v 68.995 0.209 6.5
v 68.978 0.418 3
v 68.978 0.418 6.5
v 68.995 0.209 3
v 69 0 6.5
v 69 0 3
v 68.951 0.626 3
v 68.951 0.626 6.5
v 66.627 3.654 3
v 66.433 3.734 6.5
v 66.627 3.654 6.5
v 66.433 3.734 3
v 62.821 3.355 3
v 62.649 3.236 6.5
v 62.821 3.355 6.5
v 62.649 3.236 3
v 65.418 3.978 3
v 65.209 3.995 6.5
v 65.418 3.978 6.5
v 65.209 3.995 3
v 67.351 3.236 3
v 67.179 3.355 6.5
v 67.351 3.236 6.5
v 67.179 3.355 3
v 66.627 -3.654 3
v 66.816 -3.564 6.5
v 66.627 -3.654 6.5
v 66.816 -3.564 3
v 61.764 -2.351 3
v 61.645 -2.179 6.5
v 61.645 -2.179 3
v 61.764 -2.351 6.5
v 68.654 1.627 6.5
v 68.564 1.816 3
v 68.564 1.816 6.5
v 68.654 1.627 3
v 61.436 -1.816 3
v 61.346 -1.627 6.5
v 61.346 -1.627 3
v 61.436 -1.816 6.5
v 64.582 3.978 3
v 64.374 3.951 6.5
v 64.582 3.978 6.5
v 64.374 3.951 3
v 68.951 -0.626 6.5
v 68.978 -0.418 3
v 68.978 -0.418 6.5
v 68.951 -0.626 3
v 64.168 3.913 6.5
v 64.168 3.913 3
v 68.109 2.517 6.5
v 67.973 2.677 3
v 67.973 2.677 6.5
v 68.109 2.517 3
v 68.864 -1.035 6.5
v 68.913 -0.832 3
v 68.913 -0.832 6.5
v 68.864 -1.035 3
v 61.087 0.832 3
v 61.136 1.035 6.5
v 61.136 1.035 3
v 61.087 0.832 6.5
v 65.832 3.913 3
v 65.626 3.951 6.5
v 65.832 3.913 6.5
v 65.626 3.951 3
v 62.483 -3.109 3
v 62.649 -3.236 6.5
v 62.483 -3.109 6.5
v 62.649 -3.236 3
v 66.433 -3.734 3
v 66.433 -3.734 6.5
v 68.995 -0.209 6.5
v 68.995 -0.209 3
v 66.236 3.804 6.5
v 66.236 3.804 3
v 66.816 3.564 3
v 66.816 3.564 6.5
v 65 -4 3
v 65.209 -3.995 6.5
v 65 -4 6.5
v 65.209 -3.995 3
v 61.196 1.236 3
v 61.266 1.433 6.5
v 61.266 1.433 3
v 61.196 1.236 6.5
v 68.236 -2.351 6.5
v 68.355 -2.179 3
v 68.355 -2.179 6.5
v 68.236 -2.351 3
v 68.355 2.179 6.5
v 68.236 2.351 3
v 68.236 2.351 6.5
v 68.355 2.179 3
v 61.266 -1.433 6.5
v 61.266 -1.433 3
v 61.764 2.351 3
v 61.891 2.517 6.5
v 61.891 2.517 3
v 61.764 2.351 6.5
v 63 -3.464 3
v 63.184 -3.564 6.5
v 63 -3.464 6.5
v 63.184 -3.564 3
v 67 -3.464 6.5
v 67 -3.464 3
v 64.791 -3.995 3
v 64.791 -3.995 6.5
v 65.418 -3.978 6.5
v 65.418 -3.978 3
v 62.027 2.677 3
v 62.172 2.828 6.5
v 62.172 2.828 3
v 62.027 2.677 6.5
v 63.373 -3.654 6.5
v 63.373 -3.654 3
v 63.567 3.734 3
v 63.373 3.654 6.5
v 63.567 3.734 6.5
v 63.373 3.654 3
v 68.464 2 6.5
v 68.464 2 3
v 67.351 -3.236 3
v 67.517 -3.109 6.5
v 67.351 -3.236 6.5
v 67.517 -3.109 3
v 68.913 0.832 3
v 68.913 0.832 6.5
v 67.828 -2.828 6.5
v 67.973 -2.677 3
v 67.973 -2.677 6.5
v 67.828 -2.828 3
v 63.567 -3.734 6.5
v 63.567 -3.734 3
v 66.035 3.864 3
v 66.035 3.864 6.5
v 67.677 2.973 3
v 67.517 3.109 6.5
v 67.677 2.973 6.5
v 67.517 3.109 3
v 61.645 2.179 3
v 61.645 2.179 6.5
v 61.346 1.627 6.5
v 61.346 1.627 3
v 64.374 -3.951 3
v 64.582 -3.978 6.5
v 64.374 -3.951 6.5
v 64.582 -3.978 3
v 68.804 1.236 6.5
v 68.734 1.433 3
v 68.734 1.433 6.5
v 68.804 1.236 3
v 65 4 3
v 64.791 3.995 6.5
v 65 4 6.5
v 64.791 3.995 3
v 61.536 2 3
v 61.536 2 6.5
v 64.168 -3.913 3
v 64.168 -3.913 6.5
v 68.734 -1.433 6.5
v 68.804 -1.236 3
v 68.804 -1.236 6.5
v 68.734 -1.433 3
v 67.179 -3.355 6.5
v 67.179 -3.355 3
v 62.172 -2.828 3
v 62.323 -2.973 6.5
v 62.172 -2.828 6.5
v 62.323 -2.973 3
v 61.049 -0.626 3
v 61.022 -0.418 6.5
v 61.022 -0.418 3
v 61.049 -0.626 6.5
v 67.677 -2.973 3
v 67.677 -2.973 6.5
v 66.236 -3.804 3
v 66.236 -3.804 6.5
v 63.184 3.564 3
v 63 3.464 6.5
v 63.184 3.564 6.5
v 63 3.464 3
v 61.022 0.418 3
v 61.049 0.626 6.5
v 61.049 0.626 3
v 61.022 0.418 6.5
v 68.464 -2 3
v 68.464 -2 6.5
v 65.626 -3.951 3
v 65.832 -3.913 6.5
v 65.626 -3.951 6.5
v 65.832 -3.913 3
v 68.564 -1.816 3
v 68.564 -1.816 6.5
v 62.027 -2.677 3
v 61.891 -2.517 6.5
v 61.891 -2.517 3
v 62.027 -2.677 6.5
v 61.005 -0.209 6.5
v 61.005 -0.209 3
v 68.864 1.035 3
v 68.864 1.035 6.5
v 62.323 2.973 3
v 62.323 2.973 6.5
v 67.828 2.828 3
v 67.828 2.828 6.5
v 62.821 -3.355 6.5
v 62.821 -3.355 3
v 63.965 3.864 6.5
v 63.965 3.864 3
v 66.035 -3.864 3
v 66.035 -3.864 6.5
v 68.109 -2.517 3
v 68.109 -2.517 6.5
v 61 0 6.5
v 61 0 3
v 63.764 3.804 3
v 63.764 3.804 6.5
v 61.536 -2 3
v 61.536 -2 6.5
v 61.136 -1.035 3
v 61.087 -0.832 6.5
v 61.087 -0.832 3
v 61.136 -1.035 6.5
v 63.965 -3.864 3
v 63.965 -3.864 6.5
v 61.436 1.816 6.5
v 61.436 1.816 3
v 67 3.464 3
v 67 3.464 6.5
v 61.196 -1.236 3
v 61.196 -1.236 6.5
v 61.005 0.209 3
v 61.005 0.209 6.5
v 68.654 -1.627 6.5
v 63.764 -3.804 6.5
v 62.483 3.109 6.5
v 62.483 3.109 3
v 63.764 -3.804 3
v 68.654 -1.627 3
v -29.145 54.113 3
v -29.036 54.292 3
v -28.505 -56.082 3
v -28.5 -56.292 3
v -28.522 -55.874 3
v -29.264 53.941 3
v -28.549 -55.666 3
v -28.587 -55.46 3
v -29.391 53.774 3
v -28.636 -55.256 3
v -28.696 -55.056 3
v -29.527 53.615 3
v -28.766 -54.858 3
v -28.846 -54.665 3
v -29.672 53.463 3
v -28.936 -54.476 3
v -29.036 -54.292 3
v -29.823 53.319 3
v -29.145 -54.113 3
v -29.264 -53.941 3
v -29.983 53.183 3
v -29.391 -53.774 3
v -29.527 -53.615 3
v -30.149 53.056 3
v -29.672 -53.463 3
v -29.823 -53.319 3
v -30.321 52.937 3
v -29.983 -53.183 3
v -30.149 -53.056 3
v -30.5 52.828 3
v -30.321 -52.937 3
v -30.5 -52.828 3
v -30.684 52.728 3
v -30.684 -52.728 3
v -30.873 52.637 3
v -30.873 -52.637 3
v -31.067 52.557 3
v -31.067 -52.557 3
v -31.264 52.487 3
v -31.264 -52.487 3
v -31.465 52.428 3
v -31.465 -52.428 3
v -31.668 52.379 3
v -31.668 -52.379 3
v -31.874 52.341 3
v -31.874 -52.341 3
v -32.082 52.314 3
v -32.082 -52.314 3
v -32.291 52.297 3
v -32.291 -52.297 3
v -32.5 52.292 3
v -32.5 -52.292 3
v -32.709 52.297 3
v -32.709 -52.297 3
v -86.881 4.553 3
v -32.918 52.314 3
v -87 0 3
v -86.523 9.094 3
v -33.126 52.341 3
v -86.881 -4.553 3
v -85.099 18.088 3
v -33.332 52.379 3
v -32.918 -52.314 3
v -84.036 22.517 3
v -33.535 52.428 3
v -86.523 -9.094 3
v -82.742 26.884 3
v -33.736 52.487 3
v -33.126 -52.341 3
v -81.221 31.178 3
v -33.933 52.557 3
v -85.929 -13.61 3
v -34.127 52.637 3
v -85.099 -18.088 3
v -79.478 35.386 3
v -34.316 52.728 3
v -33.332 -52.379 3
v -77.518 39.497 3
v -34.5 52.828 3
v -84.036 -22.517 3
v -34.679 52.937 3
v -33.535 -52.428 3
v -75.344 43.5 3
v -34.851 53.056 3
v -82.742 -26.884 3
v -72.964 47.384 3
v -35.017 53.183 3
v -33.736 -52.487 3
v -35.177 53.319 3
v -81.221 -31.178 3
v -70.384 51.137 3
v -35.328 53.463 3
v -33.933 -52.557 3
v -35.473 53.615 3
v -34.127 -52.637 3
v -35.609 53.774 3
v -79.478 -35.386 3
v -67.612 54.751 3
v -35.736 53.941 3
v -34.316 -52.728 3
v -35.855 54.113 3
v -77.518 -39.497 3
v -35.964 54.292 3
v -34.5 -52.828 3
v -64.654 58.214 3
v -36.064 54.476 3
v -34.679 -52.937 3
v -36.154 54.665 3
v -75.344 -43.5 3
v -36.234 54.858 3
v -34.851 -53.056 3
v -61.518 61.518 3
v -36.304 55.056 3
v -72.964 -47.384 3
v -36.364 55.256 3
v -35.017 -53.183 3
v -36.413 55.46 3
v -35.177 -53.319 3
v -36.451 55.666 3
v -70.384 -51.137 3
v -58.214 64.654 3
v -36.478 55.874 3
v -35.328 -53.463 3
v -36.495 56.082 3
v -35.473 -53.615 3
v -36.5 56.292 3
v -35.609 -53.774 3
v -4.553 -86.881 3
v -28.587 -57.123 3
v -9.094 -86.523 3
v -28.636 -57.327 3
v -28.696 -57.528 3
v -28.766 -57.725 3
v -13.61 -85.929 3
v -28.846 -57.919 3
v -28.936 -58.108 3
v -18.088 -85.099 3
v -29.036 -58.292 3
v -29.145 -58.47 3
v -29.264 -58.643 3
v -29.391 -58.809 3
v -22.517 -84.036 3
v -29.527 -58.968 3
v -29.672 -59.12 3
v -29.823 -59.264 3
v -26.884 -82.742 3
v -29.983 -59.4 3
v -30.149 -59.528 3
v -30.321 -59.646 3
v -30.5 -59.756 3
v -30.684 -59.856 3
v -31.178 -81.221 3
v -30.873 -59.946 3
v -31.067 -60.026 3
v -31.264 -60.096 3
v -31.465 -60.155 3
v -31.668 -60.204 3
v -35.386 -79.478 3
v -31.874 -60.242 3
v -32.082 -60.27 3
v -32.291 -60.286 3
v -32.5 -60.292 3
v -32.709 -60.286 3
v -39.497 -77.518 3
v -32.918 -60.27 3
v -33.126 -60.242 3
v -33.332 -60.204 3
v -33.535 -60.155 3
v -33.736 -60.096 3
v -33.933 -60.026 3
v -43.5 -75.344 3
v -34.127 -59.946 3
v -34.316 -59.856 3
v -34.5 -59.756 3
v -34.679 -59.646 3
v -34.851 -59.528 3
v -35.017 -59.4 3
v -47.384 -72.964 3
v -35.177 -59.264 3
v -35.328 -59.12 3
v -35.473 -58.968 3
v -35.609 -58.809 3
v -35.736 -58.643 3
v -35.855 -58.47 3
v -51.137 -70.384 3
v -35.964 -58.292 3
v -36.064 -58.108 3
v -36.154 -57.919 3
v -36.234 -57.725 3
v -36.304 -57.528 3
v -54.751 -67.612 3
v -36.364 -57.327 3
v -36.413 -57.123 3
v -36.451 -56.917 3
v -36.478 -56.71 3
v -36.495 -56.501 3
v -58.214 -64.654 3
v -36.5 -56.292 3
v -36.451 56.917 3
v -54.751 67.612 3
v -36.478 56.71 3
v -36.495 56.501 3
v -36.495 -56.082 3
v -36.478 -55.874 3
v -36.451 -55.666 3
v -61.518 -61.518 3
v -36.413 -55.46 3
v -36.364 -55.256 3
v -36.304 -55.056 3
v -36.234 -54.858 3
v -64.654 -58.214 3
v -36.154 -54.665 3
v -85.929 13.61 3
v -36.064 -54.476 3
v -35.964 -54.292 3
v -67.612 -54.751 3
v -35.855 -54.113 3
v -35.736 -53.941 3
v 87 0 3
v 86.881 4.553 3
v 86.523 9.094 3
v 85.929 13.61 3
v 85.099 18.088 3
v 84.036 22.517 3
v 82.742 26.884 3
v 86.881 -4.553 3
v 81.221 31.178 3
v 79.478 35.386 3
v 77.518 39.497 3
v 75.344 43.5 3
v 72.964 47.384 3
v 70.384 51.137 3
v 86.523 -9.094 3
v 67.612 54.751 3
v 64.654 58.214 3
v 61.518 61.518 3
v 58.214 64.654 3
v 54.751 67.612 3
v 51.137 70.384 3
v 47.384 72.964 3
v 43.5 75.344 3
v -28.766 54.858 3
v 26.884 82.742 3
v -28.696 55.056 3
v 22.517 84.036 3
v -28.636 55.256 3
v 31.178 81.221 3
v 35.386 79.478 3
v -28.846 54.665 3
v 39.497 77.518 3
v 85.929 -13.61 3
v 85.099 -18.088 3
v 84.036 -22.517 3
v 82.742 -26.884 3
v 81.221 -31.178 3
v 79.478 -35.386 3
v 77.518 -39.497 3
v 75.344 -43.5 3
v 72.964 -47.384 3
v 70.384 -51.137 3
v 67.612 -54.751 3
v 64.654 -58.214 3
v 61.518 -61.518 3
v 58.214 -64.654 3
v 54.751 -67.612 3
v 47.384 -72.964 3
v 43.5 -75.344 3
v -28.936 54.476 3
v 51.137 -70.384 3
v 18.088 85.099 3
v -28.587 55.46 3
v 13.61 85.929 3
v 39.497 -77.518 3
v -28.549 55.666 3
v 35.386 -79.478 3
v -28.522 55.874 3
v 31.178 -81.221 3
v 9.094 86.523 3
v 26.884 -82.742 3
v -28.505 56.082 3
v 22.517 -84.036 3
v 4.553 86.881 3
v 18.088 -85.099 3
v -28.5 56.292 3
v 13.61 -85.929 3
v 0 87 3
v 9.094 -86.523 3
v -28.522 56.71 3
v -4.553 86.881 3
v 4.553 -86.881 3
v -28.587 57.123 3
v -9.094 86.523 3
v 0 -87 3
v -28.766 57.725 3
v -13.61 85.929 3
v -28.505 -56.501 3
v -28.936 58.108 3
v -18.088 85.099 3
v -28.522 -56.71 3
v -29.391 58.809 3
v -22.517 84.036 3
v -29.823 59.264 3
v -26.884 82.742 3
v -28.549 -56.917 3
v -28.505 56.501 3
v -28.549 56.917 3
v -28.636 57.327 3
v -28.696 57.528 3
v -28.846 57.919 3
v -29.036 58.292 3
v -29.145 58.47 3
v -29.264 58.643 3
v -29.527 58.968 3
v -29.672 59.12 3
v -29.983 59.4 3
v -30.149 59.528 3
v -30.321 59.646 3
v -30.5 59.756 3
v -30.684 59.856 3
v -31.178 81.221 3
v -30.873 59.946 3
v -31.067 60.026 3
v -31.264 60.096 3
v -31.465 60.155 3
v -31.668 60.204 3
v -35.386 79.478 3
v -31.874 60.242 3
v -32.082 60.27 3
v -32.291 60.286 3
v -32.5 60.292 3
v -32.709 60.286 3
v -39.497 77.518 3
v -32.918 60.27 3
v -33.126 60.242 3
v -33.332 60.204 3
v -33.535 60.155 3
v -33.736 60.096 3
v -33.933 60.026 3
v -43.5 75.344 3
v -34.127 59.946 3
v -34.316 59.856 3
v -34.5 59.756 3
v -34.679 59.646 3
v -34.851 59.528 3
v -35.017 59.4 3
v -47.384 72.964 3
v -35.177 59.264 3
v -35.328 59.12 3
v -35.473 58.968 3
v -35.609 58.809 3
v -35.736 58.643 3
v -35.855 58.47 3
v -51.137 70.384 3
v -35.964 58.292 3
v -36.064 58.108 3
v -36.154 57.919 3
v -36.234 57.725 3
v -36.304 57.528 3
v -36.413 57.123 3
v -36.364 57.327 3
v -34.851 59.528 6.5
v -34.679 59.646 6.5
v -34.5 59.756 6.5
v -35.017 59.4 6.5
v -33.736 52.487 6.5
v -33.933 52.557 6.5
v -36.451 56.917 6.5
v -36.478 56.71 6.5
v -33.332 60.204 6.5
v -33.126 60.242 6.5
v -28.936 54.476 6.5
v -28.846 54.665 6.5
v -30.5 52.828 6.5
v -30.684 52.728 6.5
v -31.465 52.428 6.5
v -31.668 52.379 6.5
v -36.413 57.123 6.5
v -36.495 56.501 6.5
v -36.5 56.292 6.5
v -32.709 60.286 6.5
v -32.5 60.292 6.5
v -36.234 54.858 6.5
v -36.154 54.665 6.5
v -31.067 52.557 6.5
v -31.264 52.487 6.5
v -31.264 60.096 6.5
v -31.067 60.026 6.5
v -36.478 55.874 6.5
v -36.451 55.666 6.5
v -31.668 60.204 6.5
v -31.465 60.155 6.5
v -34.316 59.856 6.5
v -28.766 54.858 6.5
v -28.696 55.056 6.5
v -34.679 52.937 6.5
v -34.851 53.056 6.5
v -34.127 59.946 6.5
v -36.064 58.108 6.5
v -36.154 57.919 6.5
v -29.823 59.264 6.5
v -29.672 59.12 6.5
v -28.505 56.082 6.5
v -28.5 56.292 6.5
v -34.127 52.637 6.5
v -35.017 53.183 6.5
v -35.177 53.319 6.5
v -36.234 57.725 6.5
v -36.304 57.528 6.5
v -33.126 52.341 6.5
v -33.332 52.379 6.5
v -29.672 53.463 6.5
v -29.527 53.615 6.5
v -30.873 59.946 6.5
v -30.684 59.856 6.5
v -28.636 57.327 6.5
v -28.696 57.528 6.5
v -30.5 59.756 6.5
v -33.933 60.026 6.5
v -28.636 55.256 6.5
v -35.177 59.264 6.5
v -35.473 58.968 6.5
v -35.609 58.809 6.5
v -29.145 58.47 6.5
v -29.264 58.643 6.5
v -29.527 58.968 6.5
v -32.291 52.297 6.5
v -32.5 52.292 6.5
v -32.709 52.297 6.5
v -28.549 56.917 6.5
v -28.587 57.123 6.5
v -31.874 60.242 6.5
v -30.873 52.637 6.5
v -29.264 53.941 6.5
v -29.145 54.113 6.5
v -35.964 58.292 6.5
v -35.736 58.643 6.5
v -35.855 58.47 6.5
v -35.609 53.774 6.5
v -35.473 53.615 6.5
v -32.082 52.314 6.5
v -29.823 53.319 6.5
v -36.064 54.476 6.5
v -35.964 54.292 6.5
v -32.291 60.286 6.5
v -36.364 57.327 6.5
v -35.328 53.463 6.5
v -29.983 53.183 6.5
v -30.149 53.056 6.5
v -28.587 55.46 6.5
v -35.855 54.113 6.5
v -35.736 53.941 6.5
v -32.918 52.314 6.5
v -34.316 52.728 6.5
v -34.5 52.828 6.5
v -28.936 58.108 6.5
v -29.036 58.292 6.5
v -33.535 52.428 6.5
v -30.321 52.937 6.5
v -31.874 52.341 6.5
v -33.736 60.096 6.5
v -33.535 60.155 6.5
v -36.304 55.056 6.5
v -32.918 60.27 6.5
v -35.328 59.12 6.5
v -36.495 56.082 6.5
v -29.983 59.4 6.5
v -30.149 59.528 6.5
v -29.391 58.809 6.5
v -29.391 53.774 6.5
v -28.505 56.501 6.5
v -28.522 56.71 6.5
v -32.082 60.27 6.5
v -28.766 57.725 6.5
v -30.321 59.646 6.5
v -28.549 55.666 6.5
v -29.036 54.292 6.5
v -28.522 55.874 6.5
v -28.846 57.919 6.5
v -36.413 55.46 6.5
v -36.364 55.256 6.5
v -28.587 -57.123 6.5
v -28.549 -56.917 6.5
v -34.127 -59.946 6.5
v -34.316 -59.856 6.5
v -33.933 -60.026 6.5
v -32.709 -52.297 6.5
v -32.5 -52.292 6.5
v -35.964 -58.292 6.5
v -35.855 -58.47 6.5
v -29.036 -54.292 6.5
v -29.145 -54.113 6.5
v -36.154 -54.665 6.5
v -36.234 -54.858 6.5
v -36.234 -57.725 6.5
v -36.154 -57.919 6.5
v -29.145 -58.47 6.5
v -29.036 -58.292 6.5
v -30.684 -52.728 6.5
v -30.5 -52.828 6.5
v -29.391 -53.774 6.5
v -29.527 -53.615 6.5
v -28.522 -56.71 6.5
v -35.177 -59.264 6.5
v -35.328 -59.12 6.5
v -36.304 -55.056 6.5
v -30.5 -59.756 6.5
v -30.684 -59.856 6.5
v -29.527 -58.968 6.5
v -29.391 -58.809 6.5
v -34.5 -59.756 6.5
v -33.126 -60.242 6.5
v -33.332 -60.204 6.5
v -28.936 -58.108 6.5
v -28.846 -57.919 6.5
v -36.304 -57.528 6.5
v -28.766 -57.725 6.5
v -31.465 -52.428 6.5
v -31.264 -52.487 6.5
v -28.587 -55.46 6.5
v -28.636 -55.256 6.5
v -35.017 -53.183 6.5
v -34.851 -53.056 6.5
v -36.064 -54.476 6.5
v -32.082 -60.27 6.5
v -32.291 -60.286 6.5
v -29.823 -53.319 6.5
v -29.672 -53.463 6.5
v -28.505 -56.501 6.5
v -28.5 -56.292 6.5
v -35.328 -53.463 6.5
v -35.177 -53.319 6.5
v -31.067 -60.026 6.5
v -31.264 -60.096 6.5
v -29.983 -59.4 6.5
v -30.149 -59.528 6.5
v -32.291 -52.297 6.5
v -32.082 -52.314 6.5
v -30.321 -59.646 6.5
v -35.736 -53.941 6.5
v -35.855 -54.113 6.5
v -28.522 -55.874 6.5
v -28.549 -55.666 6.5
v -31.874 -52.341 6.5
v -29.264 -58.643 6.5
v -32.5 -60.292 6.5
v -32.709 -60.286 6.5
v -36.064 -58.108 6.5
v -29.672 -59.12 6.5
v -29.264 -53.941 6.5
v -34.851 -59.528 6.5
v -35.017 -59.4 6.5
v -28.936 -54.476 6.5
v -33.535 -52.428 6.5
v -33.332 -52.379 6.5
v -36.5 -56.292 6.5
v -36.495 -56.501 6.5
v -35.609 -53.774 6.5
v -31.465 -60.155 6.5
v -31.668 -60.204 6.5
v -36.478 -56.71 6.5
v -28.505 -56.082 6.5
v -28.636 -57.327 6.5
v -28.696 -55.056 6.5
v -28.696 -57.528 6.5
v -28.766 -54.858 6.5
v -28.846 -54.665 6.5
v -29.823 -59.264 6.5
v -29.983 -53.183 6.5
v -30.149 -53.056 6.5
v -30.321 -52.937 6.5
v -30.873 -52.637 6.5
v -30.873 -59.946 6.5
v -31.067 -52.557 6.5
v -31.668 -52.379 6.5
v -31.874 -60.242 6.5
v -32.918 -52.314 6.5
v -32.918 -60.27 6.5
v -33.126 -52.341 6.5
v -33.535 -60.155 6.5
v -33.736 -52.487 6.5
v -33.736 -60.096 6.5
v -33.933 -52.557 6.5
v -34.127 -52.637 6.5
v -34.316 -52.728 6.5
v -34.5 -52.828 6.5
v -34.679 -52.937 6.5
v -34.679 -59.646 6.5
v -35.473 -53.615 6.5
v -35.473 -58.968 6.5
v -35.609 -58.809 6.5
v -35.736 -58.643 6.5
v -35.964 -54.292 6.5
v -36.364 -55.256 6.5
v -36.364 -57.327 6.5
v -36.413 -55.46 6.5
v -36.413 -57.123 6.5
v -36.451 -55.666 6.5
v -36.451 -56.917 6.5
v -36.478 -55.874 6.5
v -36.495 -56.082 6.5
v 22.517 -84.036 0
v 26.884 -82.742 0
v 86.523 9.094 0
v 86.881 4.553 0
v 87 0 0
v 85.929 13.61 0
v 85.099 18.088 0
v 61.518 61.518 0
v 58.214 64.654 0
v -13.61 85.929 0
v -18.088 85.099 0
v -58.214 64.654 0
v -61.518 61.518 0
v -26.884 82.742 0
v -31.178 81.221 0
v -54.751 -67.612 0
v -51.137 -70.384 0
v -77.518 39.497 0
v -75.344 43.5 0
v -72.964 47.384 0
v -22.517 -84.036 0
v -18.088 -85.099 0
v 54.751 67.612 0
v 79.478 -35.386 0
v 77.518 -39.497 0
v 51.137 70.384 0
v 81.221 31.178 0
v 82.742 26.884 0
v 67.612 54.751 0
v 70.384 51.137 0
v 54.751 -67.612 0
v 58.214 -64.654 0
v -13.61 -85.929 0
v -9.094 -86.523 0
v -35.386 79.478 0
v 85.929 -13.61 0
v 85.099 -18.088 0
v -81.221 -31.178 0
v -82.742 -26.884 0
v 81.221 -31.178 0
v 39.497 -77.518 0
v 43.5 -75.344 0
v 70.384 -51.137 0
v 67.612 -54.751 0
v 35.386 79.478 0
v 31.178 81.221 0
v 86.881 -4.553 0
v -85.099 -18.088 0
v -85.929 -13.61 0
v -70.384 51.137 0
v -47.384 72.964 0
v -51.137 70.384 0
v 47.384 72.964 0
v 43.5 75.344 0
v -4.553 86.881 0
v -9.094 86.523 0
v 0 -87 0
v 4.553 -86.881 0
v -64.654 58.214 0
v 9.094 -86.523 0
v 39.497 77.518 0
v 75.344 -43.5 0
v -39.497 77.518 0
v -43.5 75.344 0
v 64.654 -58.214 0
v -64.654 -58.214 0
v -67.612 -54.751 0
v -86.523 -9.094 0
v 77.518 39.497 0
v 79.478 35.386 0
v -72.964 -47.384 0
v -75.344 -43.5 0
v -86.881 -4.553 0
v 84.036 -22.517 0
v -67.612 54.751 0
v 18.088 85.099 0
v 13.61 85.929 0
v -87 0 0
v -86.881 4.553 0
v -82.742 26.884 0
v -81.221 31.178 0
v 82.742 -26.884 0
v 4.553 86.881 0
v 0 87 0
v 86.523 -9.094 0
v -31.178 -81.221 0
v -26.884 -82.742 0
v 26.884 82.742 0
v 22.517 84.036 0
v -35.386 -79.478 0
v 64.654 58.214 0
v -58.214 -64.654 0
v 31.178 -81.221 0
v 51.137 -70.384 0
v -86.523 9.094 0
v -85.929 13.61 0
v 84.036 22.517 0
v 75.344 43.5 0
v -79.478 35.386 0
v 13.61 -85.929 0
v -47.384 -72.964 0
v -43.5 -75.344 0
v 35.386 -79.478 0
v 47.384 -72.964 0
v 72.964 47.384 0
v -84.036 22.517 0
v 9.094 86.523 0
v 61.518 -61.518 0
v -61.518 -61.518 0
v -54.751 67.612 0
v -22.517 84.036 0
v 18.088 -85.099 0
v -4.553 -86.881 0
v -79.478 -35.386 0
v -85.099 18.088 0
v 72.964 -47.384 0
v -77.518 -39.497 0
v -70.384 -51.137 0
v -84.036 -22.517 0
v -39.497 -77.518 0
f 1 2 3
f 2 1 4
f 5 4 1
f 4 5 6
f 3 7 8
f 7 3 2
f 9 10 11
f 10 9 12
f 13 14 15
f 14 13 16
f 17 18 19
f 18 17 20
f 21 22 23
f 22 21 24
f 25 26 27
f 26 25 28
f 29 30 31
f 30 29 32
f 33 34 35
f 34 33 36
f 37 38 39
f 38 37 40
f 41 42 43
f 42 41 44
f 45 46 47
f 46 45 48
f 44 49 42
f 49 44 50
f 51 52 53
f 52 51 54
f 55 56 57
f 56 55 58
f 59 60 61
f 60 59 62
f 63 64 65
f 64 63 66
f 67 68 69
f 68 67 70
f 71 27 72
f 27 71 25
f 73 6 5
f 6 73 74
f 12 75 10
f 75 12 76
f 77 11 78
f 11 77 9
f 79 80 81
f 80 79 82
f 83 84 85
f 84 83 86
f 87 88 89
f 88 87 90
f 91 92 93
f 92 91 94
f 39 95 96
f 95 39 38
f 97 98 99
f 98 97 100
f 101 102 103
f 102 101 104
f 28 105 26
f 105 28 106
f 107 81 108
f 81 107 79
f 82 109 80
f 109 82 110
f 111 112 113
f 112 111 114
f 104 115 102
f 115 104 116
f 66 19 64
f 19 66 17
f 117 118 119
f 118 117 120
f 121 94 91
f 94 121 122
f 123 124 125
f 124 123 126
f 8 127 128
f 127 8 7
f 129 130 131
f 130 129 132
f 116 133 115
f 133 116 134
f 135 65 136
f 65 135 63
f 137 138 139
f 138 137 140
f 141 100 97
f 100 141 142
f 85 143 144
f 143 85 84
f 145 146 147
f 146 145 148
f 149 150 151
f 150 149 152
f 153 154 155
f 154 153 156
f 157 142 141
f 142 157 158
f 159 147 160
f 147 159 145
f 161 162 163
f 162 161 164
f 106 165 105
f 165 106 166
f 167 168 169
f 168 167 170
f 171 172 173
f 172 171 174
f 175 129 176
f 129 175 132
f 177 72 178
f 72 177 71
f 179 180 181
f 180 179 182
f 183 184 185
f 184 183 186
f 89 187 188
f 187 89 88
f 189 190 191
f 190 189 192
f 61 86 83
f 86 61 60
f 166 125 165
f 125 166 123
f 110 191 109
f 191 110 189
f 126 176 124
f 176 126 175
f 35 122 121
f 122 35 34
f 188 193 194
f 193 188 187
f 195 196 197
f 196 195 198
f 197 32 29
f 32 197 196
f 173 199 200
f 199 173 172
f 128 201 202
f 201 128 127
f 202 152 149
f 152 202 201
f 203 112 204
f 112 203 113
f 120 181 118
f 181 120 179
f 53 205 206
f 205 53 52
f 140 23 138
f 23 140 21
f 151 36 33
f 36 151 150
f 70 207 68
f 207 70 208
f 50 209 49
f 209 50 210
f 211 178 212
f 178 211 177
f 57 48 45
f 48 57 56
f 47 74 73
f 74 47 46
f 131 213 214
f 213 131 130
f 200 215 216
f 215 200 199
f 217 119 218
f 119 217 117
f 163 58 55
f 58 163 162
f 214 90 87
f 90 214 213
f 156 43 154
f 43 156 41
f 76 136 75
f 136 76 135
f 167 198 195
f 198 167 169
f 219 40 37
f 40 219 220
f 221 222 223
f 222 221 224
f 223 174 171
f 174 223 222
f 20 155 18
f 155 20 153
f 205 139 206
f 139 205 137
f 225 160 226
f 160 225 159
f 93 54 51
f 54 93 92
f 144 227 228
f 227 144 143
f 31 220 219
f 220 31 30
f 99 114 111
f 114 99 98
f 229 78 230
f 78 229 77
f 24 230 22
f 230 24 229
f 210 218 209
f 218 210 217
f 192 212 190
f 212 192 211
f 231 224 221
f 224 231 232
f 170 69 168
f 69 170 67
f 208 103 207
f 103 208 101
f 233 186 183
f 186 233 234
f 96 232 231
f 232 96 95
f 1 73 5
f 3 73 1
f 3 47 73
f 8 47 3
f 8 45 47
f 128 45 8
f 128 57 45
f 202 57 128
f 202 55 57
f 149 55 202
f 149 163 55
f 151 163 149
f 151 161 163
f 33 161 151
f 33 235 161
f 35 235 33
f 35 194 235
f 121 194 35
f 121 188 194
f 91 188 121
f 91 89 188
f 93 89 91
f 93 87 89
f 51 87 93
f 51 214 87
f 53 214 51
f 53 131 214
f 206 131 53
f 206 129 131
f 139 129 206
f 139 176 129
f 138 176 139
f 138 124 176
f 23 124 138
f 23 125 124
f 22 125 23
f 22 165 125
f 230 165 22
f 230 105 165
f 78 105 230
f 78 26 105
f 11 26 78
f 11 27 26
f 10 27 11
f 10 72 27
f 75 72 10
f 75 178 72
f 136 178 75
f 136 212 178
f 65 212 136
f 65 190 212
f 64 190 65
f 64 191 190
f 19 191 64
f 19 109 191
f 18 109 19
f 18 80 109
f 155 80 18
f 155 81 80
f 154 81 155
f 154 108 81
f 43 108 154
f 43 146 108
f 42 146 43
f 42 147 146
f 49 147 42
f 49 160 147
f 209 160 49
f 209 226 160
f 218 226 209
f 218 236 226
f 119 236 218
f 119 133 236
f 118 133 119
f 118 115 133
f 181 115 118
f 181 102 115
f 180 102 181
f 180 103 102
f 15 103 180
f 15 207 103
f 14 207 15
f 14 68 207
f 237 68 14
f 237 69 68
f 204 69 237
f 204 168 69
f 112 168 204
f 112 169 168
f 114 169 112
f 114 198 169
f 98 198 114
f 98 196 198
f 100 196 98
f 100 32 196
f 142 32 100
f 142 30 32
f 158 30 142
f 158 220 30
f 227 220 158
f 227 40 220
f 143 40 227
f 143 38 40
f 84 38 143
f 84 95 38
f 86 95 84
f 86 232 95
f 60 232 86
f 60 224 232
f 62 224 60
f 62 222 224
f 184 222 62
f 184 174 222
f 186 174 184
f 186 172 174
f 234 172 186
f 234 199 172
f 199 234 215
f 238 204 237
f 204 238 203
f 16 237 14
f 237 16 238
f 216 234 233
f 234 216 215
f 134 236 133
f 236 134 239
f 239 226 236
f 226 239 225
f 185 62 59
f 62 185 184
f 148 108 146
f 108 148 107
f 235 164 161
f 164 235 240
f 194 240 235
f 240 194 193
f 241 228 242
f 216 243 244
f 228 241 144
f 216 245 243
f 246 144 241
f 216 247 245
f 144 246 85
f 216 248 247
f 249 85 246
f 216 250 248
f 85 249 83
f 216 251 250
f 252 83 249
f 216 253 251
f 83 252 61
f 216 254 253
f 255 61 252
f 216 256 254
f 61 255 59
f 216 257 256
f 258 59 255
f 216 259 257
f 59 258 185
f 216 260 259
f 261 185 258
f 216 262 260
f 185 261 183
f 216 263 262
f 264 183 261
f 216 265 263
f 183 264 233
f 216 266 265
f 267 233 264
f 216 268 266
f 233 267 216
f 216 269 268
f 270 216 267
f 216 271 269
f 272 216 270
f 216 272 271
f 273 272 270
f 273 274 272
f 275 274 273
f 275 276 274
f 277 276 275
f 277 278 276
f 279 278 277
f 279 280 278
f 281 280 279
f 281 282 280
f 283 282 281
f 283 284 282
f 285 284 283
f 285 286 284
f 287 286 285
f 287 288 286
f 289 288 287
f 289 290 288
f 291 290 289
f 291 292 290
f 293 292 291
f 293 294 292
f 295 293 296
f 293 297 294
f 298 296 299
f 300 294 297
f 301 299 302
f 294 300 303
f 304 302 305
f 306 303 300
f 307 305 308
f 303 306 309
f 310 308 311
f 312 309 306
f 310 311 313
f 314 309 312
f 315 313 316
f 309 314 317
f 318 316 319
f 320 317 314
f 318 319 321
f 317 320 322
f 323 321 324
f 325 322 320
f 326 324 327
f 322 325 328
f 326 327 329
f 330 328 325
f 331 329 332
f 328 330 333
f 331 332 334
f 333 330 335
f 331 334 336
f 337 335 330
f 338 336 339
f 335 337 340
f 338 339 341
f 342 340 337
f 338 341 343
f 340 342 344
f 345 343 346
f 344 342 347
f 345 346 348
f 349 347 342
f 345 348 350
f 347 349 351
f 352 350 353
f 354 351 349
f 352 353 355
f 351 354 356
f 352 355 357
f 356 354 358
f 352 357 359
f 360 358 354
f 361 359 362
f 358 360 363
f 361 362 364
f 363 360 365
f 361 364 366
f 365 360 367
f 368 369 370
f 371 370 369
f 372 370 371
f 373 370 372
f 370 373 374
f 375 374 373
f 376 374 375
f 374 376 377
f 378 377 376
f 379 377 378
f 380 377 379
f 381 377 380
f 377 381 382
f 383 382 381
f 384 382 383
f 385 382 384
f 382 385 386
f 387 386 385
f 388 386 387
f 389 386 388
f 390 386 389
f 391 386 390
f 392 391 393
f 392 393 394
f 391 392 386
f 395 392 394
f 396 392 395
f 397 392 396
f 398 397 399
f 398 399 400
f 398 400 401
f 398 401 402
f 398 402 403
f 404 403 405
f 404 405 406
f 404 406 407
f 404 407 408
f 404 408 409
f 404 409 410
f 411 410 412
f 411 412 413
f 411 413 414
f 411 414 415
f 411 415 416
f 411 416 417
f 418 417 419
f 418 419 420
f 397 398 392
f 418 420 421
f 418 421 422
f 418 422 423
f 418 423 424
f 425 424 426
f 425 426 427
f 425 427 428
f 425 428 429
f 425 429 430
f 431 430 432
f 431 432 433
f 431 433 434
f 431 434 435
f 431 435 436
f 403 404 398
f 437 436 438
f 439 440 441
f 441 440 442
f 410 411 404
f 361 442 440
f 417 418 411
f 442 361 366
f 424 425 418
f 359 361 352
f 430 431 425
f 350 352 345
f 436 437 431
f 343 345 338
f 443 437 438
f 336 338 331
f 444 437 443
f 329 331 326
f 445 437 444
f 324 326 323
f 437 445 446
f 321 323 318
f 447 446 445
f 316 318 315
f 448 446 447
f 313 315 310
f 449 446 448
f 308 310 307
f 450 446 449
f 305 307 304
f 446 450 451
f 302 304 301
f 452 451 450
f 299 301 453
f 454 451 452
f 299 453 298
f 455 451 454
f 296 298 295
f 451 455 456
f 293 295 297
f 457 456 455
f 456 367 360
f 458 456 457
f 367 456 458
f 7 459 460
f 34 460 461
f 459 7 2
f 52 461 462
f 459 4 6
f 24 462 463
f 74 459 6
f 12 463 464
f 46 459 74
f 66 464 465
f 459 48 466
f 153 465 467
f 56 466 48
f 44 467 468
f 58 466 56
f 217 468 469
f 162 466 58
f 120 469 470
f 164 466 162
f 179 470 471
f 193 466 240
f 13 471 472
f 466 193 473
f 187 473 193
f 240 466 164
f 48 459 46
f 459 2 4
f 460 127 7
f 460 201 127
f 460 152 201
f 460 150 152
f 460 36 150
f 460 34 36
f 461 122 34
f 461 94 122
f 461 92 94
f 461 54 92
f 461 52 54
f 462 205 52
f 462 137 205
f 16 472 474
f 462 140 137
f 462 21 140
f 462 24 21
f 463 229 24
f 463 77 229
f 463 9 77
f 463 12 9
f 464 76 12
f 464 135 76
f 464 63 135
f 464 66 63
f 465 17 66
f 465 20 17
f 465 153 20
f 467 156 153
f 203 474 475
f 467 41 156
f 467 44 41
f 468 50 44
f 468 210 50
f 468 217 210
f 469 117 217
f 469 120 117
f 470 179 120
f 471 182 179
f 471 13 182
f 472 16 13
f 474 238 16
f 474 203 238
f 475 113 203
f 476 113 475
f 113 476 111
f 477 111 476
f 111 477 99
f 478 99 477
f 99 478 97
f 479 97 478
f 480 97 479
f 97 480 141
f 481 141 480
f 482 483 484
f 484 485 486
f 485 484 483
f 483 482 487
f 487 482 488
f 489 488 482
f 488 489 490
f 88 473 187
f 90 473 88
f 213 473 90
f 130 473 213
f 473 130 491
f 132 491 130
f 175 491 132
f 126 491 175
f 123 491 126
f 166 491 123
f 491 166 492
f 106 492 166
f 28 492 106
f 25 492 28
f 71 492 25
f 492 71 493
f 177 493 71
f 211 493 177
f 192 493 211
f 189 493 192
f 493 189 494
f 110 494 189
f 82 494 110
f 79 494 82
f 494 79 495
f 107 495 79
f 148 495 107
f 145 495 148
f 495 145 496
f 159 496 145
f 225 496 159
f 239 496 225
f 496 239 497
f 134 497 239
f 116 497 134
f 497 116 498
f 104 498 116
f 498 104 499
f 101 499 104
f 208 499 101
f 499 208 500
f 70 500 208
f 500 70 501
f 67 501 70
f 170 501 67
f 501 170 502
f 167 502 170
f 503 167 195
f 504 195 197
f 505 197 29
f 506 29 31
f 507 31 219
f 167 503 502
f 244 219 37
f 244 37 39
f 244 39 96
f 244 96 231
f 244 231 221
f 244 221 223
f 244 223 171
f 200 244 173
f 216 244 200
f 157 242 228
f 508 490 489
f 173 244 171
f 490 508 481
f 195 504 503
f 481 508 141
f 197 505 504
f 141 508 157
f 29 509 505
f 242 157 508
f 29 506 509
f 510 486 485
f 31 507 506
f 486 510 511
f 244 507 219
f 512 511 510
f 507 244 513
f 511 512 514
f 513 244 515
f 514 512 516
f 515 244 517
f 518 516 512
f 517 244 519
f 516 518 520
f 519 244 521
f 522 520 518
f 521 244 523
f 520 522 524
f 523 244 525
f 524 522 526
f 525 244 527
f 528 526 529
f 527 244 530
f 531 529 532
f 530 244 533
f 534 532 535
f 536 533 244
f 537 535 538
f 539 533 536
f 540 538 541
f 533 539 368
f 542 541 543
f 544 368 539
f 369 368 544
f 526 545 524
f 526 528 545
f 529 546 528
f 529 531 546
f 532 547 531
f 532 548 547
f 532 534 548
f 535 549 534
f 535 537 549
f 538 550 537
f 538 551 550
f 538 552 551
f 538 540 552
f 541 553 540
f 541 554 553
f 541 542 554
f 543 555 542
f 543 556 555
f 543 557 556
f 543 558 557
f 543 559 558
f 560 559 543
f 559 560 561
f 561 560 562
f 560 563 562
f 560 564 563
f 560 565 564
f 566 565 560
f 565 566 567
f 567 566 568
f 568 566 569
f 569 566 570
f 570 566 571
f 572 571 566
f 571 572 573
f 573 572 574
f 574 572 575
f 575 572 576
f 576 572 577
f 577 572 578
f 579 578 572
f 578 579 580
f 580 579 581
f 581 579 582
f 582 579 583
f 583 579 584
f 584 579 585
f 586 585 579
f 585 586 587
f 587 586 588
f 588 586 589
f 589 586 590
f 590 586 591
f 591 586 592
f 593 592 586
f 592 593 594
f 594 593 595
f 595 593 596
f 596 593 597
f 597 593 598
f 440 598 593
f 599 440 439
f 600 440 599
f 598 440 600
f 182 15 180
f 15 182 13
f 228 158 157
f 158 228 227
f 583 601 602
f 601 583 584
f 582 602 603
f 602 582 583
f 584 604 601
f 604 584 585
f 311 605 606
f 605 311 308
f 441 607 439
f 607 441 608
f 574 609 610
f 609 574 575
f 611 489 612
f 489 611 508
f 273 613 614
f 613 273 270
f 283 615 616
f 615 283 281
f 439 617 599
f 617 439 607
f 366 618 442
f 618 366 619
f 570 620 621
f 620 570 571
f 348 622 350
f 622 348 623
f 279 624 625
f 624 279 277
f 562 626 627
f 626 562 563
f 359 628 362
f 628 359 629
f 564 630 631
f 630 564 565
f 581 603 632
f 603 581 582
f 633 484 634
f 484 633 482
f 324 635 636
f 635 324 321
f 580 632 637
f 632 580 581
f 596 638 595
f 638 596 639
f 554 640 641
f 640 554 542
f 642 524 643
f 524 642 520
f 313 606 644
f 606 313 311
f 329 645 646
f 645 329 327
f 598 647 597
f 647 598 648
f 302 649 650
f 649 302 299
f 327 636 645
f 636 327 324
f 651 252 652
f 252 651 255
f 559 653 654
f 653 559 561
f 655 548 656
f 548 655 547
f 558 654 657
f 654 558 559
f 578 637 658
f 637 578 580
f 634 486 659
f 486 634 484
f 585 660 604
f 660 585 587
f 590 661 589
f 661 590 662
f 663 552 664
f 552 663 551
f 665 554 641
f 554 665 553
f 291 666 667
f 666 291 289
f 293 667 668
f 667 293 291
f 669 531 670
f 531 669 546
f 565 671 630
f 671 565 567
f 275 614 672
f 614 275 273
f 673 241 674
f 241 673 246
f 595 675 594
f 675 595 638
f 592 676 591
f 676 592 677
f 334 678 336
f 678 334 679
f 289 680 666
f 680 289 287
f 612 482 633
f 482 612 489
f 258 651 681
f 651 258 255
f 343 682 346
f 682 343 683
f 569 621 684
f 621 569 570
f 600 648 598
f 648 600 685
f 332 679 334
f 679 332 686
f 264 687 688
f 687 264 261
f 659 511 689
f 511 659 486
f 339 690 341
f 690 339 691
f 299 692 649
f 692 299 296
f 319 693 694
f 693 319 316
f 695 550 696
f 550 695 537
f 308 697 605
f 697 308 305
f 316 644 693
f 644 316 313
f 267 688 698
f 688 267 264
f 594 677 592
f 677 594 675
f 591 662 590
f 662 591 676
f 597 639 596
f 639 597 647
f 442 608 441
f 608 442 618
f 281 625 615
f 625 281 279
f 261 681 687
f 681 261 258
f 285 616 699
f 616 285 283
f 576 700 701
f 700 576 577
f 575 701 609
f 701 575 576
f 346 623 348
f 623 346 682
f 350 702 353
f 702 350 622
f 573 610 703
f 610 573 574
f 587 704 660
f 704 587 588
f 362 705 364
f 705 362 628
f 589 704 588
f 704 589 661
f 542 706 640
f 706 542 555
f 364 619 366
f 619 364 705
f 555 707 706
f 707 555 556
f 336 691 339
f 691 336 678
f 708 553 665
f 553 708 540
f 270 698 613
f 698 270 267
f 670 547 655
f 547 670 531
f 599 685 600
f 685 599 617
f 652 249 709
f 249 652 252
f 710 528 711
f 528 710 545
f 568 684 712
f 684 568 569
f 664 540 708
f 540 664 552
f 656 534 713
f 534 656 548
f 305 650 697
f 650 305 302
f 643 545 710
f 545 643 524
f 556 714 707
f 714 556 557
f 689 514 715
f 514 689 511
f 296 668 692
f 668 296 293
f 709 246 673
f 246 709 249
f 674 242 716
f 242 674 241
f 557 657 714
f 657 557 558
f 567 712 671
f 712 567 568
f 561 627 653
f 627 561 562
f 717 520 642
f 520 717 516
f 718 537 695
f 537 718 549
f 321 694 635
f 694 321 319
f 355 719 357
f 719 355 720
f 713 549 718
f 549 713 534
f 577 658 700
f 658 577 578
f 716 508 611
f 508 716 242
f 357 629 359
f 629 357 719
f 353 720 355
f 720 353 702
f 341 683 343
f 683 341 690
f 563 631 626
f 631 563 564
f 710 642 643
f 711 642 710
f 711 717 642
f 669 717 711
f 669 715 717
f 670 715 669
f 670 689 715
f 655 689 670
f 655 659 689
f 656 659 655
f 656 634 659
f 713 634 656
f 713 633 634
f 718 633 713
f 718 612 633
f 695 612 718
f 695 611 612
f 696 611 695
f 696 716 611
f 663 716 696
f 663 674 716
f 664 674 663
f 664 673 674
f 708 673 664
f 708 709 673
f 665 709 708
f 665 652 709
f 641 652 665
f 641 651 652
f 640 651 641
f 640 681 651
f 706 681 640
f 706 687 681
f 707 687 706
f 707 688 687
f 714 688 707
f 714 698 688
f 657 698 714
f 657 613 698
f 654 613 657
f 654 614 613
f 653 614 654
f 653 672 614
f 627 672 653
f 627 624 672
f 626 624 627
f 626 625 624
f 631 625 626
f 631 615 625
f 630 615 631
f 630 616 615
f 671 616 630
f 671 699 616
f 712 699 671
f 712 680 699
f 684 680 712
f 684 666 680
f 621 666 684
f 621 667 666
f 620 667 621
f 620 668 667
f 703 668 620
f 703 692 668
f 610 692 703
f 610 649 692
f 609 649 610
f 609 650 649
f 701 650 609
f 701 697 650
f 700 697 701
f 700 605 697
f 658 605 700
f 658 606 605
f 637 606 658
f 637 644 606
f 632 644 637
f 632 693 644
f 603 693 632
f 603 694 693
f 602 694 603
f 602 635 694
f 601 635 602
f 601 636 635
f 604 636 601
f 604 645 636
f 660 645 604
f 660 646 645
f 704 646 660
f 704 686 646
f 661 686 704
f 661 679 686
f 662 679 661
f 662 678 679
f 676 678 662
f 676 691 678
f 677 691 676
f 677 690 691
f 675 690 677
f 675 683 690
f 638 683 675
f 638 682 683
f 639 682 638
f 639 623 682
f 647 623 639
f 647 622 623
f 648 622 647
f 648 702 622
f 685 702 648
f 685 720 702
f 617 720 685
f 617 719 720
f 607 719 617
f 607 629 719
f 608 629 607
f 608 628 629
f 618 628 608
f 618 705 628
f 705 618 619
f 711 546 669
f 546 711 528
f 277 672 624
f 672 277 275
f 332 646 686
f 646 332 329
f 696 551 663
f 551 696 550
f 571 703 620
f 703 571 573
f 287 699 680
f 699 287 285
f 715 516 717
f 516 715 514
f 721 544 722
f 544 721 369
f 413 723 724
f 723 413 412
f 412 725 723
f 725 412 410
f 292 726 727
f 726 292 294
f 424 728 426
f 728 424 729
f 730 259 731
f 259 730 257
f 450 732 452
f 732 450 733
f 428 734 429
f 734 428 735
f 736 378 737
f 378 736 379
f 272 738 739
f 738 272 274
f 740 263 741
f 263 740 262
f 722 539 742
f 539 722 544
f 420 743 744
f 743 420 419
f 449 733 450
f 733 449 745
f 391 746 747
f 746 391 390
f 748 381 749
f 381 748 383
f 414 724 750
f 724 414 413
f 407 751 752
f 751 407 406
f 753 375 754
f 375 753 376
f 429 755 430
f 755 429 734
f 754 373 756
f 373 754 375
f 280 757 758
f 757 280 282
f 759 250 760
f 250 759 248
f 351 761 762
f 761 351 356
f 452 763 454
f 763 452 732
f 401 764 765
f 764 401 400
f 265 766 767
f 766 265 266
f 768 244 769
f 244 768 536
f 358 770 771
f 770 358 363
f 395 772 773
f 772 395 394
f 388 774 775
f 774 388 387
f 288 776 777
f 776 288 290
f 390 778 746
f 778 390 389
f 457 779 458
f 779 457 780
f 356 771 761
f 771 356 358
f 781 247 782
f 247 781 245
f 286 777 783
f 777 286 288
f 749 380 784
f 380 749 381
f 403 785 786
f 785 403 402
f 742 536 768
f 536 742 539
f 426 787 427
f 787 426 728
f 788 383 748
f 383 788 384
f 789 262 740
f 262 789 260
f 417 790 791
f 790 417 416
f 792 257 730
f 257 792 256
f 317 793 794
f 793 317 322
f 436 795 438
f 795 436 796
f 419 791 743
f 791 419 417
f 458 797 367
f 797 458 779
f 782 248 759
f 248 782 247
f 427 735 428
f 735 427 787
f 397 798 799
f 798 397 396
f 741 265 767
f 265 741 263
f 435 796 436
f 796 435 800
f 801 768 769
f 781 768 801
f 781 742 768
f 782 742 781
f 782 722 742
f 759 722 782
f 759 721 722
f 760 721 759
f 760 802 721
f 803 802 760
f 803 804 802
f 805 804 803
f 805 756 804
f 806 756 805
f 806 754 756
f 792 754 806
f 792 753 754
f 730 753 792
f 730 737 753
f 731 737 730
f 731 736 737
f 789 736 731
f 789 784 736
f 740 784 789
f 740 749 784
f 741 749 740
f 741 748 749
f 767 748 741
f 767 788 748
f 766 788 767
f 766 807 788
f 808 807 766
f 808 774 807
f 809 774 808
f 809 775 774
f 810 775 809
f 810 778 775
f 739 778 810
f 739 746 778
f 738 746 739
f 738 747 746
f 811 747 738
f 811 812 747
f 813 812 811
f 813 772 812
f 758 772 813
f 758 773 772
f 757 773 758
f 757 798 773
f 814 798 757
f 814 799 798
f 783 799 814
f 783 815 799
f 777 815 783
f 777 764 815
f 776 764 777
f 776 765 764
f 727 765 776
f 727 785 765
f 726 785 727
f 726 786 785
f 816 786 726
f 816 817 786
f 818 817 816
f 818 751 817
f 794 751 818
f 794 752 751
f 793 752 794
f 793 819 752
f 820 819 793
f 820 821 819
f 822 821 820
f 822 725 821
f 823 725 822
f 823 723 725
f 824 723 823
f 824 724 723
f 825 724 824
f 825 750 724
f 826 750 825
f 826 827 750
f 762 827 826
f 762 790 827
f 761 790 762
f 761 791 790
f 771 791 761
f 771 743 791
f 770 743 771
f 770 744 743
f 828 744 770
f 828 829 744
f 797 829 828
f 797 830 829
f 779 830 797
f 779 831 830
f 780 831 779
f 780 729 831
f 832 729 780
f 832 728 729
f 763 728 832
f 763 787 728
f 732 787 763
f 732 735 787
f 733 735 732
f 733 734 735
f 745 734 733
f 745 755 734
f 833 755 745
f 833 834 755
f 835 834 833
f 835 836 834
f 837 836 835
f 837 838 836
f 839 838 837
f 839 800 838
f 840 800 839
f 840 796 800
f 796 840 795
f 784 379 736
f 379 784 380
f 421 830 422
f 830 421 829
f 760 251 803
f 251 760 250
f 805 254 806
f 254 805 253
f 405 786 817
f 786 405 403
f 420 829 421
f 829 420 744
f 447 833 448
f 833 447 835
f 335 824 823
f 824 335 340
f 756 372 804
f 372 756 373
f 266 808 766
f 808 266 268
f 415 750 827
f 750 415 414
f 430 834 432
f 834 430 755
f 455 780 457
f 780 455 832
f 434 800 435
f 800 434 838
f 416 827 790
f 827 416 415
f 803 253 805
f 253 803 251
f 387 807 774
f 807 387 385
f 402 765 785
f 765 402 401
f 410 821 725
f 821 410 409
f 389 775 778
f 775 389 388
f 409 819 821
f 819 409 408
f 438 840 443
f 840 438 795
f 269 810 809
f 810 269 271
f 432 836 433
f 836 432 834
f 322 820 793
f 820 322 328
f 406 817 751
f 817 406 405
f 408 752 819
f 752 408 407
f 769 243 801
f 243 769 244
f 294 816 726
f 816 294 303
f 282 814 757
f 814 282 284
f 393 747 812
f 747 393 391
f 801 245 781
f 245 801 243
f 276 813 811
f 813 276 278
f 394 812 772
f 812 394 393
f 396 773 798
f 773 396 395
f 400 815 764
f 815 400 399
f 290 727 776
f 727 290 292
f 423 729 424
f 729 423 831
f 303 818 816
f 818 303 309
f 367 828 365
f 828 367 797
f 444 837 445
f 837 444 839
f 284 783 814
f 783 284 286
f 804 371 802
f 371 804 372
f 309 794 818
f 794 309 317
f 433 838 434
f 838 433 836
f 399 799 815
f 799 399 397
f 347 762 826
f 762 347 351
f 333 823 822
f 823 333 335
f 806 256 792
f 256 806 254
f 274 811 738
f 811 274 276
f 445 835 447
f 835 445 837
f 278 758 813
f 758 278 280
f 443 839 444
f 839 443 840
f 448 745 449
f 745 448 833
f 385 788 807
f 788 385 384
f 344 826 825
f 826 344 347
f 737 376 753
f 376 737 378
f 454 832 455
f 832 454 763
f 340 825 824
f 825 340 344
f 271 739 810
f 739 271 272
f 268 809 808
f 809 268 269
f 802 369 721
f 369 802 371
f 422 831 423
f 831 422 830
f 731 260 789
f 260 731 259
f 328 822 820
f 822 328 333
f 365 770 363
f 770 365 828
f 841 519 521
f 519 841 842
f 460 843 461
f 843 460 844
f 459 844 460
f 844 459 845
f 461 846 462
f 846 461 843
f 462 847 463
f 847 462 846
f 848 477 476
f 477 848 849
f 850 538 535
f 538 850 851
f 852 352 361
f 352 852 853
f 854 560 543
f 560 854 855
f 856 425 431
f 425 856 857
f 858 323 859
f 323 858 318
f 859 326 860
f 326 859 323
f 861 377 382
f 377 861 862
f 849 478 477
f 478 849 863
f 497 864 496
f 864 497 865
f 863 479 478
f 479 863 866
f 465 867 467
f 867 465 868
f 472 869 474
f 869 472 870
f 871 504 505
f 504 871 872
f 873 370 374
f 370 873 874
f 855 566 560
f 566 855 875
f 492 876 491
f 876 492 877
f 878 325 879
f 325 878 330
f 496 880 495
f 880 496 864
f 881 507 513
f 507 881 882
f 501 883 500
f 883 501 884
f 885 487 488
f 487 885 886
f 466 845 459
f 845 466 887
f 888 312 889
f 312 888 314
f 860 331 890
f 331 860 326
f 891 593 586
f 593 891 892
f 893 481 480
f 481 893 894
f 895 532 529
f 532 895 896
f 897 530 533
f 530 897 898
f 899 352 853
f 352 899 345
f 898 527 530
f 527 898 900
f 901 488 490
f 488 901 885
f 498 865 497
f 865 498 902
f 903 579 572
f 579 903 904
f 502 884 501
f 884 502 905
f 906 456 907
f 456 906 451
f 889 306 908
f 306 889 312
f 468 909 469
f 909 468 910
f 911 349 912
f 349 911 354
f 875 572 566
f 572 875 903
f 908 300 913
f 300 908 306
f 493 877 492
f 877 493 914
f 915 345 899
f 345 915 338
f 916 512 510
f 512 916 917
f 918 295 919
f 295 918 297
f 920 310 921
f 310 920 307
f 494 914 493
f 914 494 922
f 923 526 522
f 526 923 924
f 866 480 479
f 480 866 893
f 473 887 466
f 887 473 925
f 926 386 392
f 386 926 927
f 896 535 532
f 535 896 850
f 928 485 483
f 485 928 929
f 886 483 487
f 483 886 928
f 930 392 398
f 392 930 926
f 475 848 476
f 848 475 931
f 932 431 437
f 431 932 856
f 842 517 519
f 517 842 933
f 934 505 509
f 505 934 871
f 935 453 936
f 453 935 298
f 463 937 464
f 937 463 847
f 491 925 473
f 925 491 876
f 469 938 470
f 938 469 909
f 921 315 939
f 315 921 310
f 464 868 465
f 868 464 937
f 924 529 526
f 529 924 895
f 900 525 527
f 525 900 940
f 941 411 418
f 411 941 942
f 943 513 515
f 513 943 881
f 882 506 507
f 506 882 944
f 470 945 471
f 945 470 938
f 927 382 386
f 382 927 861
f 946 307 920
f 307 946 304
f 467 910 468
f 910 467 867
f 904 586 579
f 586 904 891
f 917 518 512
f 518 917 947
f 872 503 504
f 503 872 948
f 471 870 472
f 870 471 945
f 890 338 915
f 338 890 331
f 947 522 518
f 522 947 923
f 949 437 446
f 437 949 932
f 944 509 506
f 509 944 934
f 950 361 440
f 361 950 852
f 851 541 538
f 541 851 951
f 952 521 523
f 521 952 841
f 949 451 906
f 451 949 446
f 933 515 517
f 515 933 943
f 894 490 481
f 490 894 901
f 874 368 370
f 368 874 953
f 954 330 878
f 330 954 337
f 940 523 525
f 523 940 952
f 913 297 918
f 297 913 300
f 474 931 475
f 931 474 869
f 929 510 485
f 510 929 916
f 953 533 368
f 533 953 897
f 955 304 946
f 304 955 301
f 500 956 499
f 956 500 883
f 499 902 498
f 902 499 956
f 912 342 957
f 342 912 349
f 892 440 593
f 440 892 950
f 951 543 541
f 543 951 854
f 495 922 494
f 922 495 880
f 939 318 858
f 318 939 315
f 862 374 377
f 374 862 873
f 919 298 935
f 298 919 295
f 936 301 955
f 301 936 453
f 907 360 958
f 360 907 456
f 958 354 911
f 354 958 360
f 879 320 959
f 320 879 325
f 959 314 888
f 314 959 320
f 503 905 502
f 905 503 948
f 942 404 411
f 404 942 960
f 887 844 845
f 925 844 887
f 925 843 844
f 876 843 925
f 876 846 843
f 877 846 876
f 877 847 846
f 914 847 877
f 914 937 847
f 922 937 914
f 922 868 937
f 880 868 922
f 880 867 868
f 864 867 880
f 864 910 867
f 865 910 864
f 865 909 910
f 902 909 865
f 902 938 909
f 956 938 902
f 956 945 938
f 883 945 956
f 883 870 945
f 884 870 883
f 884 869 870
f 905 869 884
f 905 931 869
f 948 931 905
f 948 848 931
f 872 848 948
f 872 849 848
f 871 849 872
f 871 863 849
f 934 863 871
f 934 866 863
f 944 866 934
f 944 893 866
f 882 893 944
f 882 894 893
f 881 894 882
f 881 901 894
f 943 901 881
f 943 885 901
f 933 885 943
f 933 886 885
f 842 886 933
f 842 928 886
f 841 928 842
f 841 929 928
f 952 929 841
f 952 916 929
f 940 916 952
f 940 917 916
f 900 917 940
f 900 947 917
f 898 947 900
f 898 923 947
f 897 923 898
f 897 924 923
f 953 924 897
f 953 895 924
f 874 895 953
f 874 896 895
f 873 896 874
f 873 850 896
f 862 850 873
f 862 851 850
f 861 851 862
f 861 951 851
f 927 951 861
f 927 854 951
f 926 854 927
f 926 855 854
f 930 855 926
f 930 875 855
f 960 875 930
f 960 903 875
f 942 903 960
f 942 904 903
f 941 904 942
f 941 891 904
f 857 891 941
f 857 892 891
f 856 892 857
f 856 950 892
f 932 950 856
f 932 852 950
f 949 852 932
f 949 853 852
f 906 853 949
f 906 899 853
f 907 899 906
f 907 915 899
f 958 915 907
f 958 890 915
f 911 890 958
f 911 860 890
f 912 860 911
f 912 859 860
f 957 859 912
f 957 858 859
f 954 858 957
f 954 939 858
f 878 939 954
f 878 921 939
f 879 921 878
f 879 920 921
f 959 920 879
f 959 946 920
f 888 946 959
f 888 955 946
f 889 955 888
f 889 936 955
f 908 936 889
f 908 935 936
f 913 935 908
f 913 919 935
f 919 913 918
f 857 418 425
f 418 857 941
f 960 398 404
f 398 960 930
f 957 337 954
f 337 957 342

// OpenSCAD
$fn = 120;

// ==========================================
// PRINT FILE: Pan Adapter Expansion Disc
// ==========================================
// Thin disc that sits ON TOP of the existing 155mm pan adapter.
// 3 nubs drop into the post sockets for alignment.
// Adds 3/4" (19mm) to the diameter — temporary fix until
// full new box is built.
//
// Print flat, nubs facing UP (flip to install).
// PLA, no supports.
// ==========================================

// --- Existing pan adapter reference ---
existing_pan_od    = 155.0;
post_socket_d      = 8.4;       // existing socket diameter
post_socket_depth  = 4.0;       // existing socket depth
post_count         = 3;
bolt_circle_r      = 65.0;

// --- Expansion disc ---
expansion          = 19.0;      // 3/4 inch
disc_od            = existing_pan_od + expansion;  // 174mm
disc_thickness     = 3.0;       // thin, just a platform

// --- Alignment nubs (drop into post sockets) ---
nub_d              = post_socket_d - 0.4;  // 8.0mm — snug in 8.4mm socket
nub_h              = post_socket_depth - 0.5;  // 3.5mm — doesn't bottom out

// --- The part ---
union() {
    // Main disc
    cylinder(d = disc_od, h = disc_thickness);

    // 3 alignment nubs on bottom (printed facing up, flip to install)
    for (i = [0 : post_count - 1]) {
        rotate([0, 0, i * 120])
            translate([bolt_circle_r, 0, disc_thickness])
                cylinder(d = nub_d, h = nub_h);
    }
}
